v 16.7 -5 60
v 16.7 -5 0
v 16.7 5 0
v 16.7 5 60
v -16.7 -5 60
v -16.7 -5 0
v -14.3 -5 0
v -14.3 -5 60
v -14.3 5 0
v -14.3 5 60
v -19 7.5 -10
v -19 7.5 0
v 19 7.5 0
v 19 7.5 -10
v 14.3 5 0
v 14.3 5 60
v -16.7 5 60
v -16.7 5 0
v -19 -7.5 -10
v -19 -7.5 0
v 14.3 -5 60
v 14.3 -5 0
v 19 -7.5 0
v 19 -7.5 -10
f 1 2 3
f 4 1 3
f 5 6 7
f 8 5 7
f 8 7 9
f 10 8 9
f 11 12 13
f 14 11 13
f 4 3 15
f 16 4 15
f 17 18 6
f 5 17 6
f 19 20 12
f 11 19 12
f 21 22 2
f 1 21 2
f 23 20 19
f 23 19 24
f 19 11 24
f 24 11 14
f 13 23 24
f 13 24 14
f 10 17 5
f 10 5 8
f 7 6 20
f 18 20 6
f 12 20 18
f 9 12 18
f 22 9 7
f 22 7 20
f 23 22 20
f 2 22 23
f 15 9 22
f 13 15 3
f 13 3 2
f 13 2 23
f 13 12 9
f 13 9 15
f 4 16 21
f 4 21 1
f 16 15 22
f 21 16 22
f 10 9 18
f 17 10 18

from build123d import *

# Parameters (mm, degrees)
F2_DEPTH = 60
F1_W     = 38
F1_H     = 15
F3_DEPTH = 10


with BuildPart() as f2:
    # F0 (on Top) → F2 (new body)
    with BuildSketch(Plane.XY):
        Polygon((14.3, 5), (14.3, 0), (14.3, -5), (16.7, -5), (16.7, 5), align=None)
    extrude(amount=F2_DEPTH)



with BuildPart() as f2b:
    # F0 (on Top) → F2, piece 2 (new body)
    with BuildSketch(Plane.XY):
        Polygon((-14.3, -5), (-14.3, 0), (-14.3, 5), (-16.7, 5), (-16.7, -5), align=None)
    extrude(amount=F2_DEPTH)


with BuildPart() as f2_1:
    add(f2.part)

    add(f2b.part)  # F3 merges F2b
    # F1 (on Top) → F3 (join)
    with BuildSketch(Plane.XY):
        Rectangle(F1_W, F1_H)
    extrude(amount=-F3_DEPTH)


solid = f2_1.part
